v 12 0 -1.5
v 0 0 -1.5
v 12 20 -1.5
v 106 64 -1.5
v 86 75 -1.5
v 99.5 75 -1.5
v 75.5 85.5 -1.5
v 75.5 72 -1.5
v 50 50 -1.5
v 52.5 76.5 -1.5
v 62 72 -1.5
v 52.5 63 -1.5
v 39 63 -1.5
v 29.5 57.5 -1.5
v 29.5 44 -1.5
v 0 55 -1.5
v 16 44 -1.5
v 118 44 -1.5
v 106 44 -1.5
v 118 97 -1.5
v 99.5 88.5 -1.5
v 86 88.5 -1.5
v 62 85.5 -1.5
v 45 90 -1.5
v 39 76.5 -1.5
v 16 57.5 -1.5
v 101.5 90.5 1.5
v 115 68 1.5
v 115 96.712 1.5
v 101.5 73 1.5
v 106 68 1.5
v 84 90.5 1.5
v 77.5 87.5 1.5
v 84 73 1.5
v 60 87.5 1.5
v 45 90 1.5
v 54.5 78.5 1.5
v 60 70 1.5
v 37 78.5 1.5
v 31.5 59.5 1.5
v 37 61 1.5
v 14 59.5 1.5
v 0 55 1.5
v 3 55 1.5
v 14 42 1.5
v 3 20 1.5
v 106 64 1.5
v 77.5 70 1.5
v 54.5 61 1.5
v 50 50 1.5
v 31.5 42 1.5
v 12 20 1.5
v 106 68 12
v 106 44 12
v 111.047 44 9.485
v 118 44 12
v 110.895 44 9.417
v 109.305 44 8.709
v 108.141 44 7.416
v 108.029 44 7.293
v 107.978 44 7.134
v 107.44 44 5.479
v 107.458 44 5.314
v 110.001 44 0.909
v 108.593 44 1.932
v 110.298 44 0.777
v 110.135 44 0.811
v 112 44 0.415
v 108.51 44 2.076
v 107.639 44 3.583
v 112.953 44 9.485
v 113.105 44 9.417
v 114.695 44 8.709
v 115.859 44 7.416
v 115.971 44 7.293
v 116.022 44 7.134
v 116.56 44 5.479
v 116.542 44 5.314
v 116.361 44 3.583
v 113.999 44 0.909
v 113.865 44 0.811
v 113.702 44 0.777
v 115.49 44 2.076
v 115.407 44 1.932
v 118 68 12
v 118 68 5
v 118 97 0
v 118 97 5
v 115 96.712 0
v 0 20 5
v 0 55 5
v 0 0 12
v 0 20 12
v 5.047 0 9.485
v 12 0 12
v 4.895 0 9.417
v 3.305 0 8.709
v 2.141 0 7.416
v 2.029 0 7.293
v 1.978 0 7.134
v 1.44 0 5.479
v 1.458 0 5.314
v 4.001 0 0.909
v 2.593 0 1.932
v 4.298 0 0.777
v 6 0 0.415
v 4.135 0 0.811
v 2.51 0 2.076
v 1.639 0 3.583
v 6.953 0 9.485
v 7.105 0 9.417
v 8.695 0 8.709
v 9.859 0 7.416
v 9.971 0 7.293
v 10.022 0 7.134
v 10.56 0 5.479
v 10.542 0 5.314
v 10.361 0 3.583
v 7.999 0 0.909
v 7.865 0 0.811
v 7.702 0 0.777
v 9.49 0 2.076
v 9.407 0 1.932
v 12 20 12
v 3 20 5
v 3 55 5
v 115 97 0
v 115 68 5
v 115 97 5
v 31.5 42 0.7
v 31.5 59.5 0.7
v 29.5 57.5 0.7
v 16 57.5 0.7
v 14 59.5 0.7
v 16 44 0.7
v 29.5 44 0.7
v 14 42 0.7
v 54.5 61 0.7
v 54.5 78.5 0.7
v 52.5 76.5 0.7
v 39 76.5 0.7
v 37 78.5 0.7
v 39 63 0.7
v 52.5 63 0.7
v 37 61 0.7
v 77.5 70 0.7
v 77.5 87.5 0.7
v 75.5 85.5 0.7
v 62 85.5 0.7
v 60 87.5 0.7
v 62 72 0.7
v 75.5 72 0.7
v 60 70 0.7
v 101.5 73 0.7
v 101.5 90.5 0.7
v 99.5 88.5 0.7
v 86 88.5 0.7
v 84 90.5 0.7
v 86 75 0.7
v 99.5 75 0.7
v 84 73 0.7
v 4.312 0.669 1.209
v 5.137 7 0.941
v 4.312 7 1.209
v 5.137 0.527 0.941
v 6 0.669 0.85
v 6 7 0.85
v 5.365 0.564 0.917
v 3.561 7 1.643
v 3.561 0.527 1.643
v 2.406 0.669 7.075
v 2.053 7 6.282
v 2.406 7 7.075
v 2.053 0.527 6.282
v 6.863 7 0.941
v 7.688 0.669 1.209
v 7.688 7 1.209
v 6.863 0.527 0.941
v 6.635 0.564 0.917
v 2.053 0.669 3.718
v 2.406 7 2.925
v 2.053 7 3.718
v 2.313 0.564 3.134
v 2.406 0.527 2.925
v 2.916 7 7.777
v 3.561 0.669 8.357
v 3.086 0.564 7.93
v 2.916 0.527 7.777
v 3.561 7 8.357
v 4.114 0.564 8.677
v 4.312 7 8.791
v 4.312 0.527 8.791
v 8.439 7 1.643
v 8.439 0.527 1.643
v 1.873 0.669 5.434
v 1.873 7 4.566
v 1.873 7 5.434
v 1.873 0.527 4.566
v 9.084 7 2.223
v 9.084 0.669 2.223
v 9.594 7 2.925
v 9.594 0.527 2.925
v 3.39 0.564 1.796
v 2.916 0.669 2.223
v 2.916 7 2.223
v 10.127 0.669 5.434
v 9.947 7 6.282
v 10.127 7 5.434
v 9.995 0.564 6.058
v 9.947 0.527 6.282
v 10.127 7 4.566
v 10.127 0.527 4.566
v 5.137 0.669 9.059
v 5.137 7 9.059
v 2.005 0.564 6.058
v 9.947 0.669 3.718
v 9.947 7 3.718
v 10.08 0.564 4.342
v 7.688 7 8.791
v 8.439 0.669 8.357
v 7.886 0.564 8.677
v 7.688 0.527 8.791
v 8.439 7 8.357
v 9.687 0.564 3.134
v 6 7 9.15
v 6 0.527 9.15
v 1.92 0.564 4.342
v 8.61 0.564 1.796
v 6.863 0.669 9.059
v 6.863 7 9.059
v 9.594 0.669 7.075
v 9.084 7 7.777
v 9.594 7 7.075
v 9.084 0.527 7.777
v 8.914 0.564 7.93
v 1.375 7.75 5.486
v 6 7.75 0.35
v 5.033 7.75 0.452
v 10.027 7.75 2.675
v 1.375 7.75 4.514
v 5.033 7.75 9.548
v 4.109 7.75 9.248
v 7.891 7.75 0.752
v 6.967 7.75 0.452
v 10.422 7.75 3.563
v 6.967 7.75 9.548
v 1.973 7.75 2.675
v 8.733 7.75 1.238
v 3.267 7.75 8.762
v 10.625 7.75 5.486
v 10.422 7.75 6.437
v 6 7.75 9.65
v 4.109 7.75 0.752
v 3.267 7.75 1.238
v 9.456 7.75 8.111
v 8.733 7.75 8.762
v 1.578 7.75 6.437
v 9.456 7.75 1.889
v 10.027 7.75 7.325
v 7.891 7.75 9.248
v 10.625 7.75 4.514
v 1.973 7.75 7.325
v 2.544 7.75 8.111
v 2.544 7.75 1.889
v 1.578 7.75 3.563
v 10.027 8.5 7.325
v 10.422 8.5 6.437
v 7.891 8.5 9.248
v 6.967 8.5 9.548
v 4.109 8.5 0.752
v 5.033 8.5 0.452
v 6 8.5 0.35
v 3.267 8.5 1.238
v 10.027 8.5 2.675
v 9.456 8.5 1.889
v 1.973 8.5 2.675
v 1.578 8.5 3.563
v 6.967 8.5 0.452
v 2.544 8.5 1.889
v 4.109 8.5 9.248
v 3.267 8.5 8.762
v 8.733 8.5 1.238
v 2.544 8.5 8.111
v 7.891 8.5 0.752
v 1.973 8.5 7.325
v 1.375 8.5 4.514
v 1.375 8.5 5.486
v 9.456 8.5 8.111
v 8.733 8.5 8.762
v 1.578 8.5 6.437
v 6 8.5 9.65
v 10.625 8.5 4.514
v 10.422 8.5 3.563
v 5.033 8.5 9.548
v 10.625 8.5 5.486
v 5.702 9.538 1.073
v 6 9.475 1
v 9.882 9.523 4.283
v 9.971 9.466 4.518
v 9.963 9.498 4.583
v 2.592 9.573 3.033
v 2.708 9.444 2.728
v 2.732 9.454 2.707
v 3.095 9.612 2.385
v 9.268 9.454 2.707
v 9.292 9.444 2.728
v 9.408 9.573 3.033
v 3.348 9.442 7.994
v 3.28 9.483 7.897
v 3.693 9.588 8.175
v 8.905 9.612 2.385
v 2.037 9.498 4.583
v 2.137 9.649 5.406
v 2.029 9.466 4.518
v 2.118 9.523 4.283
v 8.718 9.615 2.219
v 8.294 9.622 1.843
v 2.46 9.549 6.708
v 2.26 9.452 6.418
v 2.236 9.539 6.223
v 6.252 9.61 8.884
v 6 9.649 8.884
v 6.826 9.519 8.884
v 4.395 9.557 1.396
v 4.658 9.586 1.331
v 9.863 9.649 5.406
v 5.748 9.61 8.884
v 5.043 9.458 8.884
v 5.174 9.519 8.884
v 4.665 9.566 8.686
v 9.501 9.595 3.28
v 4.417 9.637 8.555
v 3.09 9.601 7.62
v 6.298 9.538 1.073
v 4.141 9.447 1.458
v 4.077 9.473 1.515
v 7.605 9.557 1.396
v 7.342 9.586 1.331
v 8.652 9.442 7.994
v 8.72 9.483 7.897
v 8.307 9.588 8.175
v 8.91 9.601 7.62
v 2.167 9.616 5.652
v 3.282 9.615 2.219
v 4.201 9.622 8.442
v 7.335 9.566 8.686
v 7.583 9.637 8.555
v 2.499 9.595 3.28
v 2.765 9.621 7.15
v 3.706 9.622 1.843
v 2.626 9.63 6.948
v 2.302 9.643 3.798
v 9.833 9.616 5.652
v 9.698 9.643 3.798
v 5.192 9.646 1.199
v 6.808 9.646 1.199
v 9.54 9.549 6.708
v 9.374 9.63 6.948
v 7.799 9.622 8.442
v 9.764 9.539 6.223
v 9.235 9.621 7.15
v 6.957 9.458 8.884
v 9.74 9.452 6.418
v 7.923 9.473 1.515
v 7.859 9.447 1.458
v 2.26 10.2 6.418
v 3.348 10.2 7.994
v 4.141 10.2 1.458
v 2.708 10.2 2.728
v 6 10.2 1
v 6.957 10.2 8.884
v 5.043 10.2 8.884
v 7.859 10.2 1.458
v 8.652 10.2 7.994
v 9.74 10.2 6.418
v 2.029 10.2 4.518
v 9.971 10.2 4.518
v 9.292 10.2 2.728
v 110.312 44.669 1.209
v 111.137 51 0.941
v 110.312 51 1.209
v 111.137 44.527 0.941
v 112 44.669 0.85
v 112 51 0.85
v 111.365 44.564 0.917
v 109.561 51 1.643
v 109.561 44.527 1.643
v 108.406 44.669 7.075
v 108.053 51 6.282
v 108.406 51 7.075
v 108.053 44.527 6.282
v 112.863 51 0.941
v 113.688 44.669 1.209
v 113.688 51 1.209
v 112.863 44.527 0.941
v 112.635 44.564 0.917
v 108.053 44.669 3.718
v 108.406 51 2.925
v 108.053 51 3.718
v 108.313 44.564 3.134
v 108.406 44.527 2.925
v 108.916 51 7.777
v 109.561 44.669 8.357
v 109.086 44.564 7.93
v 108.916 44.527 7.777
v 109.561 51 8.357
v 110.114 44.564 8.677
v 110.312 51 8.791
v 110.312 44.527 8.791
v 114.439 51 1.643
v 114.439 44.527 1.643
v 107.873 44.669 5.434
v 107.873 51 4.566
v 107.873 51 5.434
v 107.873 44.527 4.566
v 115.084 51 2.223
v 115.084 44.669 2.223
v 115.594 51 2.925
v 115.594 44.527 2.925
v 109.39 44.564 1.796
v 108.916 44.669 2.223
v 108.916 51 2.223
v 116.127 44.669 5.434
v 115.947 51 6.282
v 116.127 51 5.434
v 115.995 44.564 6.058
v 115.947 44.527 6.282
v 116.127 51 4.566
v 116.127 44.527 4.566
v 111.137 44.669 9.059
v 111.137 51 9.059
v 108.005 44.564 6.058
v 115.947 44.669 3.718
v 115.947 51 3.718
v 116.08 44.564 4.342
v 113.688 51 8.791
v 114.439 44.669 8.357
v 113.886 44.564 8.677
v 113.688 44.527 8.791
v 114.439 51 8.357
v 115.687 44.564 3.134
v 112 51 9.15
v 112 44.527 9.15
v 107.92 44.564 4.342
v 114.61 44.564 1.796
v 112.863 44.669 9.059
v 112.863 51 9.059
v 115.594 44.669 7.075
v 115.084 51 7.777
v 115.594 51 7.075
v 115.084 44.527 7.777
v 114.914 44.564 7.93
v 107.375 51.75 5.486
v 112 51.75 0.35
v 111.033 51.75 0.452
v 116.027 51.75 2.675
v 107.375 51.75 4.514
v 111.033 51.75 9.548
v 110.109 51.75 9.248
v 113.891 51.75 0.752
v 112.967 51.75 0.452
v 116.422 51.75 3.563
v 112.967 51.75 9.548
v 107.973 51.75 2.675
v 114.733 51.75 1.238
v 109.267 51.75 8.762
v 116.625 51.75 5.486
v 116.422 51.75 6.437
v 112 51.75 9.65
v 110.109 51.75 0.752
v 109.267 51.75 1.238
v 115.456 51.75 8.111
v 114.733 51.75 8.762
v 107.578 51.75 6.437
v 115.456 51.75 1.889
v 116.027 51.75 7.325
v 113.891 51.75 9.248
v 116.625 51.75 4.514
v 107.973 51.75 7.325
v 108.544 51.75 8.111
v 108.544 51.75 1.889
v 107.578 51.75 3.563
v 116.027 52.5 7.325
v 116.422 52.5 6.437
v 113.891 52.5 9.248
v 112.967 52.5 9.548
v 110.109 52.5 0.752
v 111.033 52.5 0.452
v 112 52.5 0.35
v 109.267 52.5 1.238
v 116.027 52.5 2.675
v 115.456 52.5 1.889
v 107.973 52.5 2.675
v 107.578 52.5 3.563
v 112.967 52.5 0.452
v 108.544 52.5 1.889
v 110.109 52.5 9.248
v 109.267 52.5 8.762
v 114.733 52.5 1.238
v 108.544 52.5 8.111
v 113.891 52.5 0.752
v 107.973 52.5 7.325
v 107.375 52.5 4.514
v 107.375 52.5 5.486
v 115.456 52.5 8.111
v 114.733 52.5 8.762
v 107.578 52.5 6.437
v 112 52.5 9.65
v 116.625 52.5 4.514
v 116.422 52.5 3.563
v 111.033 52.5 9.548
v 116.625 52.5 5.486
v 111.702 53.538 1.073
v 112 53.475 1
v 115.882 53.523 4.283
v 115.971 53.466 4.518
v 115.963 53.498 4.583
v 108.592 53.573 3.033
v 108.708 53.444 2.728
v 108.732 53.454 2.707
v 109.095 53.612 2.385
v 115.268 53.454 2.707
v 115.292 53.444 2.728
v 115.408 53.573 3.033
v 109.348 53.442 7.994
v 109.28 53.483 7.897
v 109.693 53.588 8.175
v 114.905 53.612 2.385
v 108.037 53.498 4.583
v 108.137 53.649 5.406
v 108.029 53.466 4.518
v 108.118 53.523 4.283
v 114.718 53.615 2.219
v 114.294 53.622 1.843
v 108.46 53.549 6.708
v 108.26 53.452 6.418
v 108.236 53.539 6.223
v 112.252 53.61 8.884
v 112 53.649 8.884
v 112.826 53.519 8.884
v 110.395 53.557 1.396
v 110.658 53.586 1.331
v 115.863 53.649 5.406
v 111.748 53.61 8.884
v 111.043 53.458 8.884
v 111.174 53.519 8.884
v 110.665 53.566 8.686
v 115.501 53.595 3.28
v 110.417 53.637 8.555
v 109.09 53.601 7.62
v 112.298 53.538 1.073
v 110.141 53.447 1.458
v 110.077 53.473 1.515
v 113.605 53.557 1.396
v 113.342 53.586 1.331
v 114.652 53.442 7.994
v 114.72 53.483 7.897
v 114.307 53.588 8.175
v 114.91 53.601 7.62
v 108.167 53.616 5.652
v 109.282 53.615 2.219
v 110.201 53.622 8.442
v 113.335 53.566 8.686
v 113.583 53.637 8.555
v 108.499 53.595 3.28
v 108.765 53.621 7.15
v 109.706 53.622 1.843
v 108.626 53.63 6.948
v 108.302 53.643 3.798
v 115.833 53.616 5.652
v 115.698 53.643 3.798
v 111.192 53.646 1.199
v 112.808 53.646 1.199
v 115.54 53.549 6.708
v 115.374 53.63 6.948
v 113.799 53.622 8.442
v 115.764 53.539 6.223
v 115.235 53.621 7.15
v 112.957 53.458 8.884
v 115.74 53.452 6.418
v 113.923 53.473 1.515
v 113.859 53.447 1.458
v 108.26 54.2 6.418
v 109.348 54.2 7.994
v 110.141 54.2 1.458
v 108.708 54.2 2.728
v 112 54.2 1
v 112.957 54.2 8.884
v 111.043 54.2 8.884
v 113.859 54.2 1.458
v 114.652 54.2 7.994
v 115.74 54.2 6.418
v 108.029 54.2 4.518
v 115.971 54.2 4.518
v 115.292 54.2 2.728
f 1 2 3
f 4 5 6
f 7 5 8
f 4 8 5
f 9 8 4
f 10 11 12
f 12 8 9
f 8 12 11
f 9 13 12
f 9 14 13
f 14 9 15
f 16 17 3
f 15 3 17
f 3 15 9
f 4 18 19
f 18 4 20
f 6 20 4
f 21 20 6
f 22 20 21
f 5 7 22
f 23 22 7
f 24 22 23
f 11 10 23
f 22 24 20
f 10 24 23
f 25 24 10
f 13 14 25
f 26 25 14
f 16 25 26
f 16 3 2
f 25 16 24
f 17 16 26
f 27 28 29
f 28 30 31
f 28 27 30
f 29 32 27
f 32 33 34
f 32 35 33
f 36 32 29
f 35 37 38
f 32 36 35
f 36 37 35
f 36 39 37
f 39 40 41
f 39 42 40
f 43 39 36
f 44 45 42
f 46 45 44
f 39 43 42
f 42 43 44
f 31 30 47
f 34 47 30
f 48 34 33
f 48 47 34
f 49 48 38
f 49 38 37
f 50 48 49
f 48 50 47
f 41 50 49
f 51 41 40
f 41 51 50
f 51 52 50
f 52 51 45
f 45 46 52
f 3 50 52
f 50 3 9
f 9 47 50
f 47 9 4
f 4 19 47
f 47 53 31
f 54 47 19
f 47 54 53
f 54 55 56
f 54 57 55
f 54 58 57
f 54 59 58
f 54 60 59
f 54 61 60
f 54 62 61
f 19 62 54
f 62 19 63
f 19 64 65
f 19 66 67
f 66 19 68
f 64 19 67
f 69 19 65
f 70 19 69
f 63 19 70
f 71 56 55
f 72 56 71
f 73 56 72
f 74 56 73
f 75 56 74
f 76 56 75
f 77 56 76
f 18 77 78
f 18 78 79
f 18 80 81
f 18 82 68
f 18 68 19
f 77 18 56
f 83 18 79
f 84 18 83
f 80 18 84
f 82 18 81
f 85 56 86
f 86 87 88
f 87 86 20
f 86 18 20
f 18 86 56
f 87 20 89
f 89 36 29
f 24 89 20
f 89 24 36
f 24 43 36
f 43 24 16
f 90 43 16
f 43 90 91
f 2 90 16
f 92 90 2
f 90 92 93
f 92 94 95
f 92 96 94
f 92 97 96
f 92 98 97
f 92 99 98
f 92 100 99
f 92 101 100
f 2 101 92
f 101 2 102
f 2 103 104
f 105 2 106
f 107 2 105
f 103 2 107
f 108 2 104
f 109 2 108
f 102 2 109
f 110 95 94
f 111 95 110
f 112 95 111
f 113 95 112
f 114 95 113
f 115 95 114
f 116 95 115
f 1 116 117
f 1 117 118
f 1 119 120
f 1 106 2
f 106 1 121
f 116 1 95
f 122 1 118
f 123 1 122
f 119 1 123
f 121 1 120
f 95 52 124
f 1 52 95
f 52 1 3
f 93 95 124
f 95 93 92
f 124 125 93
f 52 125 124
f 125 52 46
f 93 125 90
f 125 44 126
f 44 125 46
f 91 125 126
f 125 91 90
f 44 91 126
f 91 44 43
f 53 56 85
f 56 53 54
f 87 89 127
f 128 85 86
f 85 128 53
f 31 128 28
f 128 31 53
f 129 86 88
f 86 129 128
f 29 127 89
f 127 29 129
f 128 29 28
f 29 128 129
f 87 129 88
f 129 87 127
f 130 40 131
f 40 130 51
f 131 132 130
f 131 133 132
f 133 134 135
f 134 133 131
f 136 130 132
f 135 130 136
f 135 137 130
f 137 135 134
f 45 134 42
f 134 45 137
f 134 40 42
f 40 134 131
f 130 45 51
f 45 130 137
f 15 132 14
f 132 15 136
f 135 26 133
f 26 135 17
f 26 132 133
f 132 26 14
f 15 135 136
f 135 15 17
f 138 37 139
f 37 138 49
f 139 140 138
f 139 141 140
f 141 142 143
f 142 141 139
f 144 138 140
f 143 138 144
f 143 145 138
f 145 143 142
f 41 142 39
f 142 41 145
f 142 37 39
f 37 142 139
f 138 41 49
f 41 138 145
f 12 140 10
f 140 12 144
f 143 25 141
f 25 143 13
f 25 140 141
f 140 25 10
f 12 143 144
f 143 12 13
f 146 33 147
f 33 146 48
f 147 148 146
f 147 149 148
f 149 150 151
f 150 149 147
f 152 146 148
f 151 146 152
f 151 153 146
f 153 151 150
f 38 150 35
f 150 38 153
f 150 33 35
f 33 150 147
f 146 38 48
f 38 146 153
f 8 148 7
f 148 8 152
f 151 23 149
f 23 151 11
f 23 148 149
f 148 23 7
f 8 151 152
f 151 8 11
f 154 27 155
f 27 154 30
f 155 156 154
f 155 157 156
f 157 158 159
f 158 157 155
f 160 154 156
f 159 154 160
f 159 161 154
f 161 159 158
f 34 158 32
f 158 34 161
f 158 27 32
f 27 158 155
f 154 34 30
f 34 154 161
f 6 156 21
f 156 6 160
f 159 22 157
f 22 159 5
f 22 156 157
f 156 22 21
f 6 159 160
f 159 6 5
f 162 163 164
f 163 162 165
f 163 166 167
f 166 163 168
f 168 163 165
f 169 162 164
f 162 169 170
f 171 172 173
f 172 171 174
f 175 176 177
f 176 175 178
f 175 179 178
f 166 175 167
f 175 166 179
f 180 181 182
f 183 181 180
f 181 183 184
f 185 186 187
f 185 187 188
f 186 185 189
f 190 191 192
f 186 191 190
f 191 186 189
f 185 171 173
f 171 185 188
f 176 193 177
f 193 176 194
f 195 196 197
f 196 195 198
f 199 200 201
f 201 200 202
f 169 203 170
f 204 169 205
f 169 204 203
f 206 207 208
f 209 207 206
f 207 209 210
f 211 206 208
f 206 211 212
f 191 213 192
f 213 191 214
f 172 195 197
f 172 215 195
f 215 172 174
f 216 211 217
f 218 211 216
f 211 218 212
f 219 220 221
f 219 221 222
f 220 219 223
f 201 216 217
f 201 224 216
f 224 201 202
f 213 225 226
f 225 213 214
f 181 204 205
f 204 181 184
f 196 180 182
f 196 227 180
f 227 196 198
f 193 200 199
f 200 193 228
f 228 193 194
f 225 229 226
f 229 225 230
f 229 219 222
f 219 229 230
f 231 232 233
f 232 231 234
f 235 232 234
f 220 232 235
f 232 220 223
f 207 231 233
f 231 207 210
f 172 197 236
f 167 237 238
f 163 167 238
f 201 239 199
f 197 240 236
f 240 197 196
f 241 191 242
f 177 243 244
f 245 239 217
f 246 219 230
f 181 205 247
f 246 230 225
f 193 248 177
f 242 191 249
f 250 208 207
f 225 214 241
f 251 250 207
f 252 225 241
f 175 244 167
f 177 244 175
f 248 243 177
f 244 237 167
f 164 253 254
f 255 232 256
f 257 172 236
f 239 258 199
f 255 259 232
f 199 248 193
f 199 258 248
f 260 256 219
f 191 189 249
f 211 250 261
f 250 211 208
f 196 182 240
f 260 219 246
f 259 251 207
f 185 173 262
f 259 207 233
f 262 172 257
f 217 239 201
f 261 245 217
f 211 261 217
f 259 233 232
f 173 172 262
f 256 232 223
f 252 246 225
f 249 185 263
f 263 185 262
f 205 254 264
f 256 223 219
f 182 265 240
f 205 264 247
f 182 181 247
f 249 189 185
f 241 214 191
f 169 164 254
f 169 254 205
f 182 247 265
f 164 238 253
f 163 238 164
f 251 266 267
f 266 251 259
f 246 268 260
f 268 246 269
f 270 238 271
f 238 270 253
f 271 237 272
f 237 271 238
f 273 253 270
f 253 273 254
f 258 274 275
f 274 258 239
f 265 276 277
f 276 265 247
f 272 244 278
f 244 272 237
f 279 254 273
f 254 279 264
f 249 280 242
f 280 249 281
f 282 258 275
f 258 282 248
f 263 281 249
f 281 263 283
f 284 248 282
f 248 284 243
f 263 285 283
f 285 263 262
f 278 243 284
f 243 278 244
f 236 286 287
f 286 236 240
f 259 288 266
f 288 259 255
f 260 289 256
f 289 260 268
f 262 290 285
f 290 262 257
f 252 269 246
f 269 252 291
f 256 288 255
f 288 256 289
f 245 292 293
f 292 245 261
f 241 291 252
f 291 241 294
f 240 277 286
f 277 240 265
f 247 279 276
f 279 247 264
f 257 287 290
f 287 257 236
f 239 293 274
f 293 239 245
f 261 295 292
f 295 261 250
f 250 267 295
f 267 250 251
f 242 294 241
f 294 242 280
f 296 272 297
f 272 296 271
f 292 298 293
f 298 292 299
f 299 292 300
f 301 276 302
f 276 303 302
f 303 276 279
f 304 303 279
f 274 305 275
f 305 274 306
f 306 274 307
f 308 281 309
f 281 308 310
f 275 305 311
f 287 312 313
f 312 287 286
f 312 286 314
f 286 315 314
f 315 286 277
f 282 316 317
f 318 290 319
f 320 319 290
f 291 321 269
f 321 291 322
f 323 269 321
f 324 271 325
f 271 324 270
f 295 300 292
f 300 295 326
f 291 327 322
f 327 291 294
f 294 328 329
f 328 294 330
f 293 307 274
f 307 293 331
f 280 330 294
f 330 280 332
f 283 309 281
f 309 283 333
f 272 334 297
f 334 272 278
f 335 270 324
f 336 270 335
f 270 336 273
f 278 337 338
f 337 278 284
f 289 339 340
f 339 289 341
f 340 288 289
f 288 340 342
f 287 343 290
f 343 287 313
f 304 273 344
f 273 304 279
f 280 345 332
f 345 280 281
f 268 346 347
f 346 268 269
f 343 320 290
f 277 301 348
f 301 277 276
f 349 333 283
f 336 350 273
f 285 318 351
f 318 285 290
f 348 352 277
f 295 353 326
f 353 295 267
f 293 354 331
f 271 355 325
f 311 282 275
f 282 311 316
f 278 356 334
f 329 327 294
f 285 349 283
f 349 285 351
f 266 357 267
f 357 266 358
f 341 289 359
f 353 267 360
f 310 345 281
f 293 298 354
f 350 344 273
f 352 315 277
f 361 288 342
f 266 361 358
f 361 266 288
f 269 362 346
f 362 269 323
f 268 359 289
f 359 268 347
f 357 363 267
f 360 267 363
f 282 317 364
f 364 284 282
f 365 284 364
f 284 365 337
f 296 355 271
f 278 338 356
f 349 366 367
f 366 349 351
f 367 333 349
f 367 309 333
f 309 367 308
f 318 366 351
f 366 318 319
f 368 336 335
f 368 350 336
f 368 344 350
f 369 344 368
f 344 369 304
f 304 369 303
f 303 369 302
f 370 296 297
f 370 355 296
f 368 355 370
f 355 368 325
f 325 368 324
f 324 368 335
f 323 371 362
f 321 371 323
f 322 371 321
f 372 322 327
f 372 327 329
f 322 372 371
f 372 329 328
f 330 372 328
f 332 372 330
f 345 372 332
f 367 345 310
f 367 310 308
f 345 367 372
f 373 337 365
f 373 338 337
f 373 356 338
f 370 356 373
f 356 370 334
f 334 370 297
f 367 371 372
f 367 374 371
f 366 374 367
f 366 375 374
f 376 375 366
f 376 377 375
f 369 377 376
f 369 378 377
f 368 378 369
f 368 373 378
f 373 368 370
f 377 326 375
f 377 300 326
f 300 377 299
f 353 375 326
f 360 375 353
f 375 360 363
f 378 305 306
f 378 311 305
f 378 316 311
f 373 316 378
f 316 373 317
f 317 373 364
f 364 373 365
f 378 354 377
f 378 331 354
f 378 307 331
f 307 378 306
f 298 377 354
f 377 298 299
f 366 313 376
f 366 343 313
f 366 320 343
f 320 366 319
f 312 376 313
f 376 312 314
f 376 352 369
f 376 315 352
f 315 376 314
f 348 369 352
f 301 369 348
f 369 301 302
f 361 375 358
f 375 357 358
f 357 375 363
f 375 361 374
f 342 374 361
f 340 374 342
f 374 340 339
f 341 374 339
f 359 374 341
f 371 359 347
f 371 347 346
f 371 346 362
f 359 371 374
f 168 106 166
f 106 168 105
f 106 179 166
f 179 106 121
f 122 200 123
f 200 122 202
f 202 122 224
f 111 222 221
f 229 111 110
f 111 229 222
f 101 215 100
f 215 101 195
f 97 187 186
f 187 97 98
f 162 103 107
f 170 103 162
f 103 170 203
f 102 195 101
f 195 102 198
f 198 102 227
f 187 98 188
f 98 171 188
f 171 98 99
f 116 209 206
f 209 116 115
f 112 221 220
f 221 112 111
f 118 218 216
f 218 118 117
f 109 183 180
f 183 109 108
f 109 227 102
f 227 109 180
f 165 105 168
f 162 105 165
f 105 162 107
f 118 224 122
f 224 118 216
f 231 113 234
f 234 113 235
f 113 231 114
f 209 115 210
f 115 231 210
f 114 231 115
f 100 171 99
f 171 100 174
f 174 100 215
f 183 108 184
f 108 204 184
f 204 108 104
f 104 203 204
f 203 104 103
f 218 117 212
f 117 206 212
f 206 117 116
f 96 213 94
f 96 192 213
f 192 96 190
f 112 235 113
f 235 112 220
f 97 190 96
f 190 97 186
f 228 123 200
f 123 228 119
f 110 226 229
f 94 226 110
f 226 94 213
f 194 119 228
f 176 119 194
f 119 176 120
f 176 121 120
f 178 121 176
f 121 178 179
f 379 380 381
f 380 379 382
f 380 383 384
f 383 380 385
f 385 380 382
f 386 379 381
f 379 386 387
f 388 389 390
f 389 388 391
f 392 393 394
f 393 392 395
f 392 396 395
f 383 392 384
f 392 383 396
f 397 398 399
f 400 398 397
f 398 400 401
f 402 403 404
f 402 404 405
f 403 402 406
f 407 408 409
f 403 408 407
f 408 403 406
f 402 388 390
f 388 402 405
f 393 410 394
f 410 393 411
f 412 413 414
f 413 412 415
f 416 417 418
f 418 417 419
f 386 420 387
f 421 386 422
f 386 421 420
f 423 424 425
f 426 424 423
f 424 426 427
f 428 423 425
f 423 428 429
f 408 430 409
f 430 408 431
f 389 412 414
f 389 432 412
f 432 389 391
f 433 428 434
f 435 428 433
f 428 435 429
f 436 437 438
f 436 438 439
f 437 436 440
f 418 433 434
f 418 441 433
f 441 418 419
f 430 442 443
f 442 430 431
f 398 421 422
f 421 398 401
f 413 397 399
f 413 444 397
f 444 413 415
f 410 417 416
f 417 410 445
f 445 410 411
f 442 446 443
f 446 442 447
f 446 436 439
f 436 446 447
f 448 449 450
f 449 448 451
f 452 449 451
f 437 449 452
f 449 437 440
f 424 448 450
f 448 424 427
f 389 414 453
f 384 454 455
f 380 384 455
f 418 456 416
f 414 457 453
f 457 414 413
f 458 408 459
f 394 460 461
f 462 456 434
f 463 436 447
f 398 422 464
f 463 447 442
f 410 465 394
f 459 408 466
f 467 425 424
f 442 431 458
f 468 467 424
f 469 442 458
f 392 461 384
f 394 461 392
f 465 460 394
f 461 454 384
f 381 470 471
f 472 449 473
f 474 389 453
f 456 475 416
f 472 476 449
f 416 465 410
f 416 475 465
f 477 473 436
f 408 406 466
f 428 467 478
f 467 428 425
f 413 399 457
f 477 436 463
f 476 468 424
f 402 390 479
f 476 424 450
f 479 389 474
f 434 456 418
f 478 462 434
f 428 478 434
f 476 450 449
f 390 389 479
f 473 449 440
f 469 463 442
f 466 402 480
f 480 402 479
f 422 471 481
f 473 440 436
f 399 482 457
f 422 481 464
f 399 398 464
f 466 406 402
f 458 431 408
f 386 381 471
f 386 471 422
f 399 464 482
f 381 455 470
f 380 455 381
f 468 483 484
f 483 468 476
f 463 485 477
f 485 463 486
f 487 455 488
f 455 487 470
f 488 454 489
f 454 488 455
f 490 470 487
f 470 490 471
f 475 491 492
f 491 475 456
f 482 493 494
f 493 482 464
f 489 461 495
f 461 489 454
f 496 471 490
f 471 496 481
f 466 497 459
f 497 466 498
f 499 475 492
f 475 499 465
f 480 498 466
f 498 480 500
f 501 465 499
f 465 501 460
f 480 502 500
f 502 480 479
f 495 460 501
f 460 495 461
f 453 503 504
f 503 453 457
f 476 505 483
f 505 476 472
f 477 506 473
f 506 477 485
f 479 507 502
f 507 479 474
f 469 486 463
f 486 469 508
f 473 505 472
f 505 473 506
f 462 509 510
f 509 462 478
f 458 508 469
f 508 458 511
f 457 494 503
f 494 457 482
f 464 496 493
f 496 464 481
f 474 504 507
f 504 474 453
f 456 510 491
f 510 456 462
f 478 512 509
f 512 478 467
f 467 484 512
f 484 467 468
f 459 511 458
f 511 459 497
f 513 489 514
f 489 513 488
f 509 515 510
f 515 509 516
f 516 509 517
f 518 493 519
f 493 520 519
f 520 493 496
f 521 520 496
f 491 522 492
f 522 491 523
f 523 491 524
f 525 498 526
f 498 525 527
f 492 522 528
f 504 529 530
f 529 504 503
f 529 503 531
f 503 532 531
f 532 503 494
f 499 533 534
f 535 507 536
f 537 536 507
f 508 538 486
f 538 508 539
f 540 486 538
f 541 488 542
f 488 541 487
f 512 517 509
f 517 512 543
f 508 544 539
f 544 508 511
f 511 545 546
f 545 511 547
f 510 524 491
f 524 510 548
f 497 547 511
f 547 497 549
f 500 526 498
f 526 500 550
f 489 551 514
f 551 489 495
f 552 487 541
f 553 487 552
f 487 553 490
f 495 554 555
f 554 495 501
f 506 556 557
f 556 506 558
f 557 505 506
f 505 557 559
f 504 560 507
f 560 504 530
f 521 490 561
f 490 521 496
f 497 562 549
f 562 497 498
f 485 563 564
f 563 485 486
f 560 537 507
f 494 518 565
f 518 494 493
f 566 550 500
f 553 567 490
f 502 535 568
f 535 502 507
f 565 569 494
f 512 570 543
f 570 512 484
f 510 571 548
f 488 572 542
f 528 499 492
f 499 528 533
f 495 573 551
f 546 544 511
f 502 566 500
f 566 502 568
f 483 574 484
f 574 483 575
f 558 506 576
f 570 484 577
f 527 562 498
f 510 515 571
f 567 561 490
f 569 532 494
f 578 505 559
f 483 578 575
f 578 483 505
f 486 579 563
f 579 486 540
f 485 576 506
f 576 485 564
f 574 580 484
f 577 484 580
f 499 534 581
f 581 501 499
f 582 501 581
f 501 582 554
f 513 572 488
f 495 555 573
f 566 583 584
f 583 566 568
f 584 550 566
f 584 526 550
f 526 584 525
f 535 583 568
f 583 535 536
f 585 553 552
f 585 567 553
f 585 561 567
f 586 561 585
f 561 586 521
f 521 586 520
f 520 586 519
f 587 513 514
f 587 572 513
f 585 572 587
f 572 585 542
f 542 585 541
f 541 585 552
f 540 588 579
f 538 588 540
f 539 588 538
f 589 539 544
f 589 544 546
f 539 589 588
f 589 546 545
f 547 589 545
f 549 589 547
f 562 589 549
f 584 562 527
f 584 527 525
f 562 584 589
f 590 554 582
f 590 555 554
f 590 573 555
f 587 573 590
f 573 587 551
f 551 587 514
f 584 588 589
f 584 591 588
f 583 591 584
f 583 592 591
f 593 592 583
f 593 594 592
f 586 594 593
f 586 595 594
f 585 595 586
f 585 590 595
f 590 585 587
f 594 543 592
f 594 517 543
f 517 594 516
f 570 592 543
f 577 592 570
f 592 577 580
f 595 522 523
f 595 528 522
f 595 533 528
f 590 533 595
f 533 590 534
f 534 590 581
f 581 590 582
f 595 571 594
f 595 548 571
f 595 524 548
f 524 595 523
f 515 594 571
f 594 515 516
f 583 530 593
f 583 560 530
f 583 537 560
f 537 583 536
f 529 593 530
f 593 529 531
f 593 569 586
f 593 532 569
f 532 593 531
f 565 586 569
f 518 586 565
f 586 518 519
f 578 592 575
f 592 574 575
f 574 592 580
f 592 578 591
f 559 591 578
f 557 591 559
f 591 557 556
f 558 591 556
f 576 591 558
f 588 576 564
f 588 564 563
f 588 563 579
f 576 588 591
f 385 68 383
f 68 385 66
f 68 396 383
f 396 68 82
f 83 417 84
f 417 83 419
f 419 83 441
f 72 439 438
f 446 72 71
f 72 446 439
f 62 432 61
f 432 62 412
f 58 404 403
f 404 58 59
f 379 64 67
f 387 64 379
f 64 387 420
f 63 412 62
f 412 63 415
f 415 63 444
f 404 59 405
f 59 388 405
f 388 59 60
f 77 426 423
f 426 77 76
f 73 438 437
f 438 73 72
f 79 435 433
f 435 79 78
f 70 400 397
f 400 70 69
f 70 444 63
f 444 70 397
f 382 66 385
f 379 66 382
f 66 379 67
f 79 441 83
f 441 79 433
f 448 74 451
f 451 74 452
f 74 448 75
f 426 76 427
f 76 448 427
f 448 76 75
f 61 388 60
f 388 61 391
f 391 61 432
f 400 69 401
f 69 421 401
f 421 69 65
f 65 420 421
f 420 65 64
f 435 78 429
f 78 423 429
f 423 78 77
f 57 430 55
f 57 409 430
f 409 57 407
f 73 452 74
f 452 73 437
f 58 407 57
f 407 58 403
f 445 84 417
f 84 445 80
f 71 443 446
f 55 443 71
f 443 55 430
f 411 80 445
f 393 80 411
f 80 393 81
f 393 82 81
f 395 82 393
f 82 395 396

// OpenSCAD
// file: squarebuttonmount.scad
module squarebuttonmount_positive() {
    union() {
        translate([0,0,2.5])cube([17.5,17.5,6]);
        translate([2,2,-2.5])cube([13.5,13.5,6]);
    }
}
// file: pins.scad
// Pin Connectors V2
// Tony Buser <tbuser@gmail.com>

// pinhole(h=5);

// test();
// pintack(h=10);
// pinpeg(h=20);

module test() {
  tolerance = 0.3;
  
  translate([-12, 12, 0]) pinpeg(h=20);
  translate([12, 12, 0]) pintack(h=10);
  
  difference() {
    union() {
      translate([0, -12, 2.5]) cube(size = [59, 20, 5], center = true);
      translate([24, -12, 7.5]) cube(size = [12, 20, 15], center = true);
    }
    translate([-24, -12, 0]) pinhole(h=5, t=tolerance);
    translate([-12, -12, 0]) pinhole(h=5, t=tolerance, tight=false);
    translate([0, -12, 0]) pinhole(h=10, t=tolerance);
    translate([12, -12, 0]) pinhole(h=10, t=tolerance, tight=false);
    translate([24, -12, 15]) rotate([0, 180, 0]) pinhole(h=10, t=tolerance);
  }
}

module pinhole(h=10, r=4, lh=3, lt=1, t=0.3, tight=true) {
  union() {
    pin_solid(h, r+(t/2), lh, lt);
    cylinder(h=h+0.2, r=r);
    // widen the cylinder slightly
    // cylinder(h=h+0.2, r=r+(t-0.2/2));
    if (tight == false) {
      cylinder(h=h+0.2, r=r+(t/2)+0.25);
    }
    // widen the entrance hole to make insertion easier
    translate([0, 0, -0.1]) cylinder(h=lh/3, r2=r, r1=r+(t/2)+(lt/2));
  }
}

module pin(h=10, r=4, lh=3, lt=1, side=false) {
  if (side) {
    pin_horizontal(h, r, lh, lt);
  } else {
    pin_vertical(h, r, lh, lt);
  }
}

module pintack(h=10, r=4, lh=3, lt=1, bh=3, br=8.75) {
  union() {
    cylinder(h=bh, r=br);
    translate([0, 0, bh]) pin(h, r, lh, lt);
  }
}

module pinpeg(h=20, r=4, lh=3, lt=1) {
  union() {
    translate([0, -h/4+0.05, 0]) pin(h/2+0.1, r, lh, lt, side=true);
    translate([0, h/4-0.05, 0]) rotate([0, 0, 180]) pin(h/2+0.1, r, lh, lt, side=true);
  }
}

module pin_vertical(h=10, r=4, lh=3, lt=1) {
  difference() {
    pin_solid(h, r, lh, lt);
    
    // center cut
    translate([-r*0.5/2, -(r*2+lt*2)/2, h/4]) cube([r*0.5, r*2+lt*2, h]);
    translate([0, 0, h/4]) cylinder(h=h+lh, r=r/2.5, $fn=20);
    // center curve
    // translate([0, 0, h/4]) rotate([90, 0, 0]) cylinder(h=r*2, r=r*0.5/2, center=true, $fn=20);
  
    // side cuts
    translate([-r*2, -lt-r*1.125, -1]) cube([r*4, lt*2, h+2]);
    translate([-r*2, -lt+r*1.125, -1]) cube([r*4, lt*2, h+2]);
  }
}

// call pin with side=true instead of this
module pin_horizontal(h=10, r=4, lh=3, lt=1) {
  translate([0, h/2, r*1.125-lt]) rotate([90, 0, 0]) pin_vertical(h, r, lh, lt);
}

// this is mainly to make the pinhole module easier
module pin_solid(h=10, r=4, lh=3, lt=1) {
  union() {
    cylinder(h=h-lh, r=r, $fn=30);
    translate([0, 0, h-lh]) cylinder(h=lh*0.25, r1=r, r2=r+(lt/2), $fn=30);
    translate([0, 0, h-lh+lh*0.25]) cylinder(h=lh*0.25, r=r+(lt/2), $fn=30);    
    translate([0, 0, h-lh+lh*0.50]) cylinder(h=lh*0.50, r1=r+(lt/2), r2=r-(lt/2), $fn=30);    
  }
}

module two_pinholes() {
 pinhole();
 translate(v=[15,0,0]) pinhole();
}
// main file
include <pins.scad>
include <squarebuttonmount.scad>

module two_pins() {

 pin();
 translate(v=[15,0,0]) pin();
}

module cylinderbuttonmount() {

 cylinder(h=5,r=3.75);

}

module fingerpad() {


 difference() {
 union() {
  linear_extrude(height = 3, center = true, convexity = 10)
  polygon([[0,0],[12,0],[12,20],[50,50],[106,64],[106,44],[118,44],[118,97],[45,90],[0,55]]); 

 translate(v=[0,0,0]) cube(size=[12,20,12]);
 translate(v=[0,0,0]) cube(size=[3,55,5]);
 translate(v=[106,44,0]) cube(size=[12,24,12]);
 translate(v=[115,44,0]) cube(size=[3,53,5]);
 }

  translate(v=[14,42,-1.8]) squarebuttonmount_positive();
  translate(v=[37,61,-1.8]) squarebuttonmount_positive();
  translate(v=[60,70,-1.8]) squarebuttonmount_positive();
  translate(v=[84,73,-1.8]) squarebuttonmount_positive();
  translate(v=[6,0,5]) rotate(a=[-90,90,0]) pinhole();
  translate(v=[112,44,5]) rotate(a=[-90,90,0]) pinhole();

 }

}

fingerpad();
